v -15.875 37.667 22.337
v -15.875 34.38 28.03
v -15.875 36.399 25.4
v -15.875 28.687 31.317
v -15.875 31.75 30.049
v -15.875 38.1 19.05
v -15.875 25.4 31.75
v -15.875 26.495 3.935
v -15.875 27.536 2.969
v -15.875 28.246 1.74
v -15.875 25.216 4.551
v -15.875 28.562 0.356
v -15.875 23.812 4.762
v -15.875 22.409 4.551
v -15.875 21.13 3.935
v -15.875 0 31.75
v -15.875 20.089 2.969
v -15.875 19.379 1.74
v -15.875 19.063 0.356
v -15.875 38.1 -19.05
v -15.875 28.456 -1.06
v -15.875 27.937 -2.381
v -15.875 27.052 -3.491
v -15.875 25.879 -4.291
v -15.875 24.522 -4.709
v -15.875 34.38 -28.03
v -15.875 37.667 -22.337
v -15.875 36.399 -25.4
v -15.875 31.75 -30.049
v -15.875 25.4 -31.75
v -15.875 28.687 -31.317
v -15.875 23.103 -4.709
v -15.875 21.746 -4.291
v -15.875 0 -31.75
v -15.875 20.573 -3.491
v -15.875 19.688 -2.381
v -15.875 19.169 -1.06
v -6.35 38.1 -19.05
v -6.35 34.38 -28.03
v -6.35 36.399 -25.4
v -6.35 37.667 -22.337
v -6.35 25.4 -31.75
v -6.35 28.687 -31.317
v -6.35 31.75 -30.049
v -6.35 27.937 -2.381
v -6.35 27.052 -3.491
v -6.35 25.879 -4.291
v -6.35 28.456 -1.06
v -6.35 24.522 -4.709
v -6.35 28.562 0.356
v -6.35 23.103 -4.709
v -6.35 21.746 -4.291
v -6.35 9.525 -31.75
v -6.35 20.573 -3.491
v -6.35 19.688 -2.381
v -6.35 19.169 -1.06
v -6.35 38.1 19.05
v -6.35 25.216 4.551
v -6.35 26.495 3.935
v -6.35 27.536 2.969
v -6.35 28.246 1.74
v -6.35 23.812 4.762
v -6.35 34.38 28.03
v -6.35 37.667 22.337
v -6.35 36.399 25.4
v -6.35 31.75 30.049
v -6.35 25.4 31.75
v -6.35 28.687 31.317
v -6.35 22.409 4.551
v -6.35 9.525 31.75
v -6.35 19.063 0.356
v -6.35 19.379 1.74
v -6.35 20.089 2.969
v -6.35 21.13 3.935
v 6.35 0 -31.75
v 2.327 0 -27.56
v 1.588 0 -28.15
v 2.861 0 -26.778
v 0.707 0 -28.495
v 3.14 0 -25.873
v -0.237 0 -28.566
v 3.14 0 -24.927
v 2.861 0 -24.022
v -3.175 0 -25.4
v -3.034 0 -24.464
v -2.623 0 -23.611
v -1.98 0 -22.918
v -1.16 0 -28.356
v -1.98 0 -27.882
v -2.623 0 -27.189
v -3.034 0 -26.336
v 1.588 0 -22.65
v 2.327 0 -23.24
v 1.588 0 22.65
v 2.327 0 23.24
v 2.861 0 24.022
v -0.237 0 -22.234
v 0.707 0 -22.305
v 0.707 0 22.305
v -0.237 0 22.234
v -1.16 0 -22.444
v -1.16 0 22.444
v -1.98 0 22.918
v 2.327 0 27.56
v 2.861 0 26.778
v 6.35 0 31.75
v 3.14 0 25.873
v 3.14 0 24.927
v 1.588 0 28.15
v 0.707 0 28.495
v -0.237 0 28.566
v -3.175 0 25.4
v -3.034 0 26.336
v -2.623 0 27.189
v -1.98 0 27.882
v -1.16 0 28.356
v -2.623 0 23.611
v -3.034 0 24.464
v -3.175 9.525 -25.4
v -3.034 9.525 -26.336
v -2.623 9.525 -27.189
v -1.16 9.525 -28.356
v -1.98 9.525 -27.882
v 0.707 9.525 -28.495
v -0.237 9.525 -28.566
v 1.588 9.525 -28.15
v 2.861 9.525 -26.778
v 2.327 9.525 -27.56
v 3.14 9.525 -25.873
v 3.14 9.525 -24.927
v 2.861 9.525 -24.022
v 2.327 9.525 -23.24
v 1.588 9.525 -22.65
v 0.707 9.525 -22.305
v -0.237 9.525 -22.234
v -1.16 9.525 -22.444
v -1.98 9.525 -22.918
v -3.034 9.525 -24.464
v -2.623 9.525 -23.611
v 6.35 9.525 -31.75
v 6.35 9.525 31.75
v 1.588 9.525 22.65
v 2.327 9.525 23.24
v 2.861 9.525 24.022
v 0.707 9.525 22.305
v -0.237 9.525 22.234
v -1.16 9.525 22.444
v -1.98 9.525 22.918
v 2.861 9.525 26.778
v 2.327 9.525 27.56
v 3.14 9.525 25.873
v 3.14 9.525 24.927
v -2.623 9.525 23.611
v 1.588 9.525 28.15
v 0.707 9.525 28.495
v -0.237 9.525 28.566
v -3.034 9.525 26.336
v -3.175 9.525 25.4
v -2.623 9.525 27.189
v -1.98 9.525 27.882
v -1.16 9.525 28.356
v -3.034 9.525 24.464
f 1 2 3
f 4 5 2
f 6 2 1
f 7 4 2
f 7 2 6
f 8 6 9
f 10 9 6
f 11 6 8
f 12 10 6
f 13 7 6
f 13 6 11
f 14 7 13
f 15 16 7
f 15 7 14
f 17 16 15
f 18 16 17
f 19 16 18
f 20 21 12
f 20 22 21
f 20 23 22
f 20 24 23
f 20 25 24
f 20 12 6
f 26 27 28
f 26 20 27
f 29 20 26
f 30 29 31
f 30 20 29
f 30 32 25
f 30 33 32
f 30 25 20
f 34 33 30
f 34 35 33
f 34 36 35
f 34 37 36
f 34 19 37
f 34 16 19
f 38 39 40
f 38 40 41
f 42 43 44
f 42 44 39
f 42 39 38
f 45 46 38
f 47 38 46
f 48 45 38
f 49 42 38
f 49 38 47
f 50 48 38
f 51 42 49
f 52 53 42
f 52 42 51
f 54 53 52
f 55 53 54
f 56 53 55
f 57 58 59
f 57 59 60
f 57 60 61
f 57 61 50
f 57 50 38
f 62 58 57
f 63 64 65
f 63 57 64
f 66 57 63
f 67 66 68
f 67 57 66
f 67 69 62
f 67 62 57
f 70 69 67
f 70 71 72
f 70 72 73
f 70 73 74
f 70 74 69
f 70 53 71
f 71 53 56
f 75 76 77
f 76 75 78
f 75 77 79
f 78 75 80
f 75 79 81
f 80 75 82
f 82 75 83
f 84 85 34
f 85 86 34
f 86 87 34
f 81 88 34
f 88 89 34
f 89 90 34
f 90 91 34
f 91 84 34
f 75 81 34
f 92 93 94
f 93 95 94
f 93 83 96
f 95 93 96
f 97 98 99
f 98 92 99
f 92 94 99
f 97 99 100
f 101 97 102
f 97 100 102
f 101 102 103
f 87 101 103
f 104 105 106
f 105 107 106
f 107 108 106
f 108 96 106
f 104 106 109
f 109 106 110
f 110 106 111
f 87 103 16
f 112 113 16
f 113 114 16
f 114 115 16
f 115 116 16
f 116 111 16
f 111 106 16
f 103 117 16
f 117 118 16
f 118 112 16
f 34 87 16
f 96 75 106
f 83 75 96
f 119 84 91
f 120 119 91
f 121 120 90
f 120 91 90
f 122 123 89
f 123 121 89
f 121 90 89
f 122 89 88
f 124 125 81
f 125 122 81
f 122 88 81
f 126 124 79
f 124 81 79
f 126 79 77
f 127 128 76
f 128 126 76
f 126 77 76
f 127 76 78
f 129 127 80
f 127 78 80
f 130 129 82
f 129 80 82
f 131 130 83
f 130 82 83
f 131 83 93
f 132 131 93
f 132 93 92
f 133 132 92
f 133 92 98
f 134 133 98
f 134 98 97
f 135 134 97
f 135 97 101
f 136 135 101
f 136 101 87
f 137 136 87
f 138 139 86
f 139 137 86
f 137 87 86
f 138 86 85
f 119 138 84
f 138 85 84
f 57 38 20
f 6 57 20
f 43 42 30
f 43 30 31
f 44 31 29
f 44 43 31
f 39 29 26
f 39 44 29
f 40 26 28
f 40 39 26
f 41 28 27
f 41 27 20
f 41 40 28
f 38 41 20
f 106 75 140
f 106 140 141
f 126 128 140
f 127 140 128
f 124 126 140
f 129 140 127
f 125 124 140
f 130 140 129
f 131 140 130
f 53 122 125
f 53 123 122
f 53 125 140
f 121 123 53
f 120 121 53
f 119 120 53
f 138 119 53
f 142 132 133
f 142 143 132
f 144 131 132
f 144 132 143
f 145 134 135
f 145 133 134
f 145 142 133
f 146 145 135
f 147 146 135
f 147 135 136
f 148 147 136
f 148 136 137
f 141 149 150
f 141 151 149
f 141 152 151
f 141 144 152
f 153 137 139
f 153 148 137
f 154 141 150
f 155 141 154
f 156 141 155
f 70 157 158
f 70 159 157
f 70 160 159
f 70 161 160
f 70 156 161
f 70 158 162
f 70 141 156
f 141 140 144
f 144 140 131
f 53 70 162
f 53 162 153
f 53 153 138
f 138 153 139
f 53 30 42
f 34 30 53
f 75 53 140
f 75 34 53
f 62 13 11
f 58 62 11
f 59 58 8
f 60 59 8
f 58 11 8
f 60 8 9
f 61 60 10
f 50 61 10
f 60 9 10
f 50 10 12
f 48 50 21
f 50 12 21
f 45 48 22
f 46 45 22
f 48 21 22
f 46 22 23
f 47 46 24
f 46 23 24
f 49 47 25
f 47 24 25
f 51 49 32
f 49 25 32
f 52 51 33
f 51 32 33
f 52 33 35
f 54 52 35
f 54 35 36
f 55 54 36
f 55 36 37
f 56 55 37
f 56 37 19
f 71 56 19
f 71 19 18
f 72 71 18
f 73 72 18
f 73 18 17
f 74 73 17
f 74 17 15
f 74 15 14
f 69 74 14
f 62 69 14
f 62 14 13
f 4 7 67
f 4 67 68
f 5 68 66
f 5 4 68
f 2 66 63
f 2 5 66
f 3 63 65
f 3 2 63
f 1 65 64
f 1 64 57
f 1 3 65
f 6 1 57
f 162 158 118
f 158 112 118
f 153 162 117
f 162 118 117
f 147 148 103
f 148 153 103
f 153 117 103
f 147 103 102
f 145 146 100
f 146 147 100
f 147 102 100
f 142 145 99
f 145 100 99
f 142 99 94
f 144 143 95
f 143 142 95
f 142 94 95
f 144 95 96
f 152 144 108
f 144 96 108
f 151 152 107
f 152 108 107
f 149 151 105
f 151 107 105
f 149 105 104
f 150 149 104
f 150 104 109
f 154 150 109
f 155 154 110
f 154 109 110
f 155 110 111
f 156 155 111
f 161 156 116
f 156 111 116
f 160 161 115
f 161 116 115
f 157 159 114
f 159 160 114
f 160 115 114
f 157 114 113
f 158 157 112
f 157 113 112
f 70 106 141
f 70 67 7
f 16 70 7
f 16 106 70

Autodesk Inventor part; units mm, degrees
ref_plane "YZ Plane" through (0, 0, 0) normal (1, 0, 0) x (0, 1, 0)
ref_plane "XZ Plane" through (0, 0, 0) normal (0, 1, 0) x (-1, 0, 0)
ref_plane "XY Plane" through (0, 0, 0) normal (0, 0, 1) x (1, 0, 0)
sketch "Sketch1" plane through (0, 0, 0) normal (0, 1, 0) x (-1, 0, 0)
  line L0 (-6.35, 31.75) -> (6.35, 31.75)
  line L1 (6.35, 31.75) -> (6.35, -31.75)
  line L2 (6.35, -31.75) -> (-6.35, -31.75)
  line L3 (-6.35, -31.75) -> (-6.35, 31.75)
  line L4 (-6.35, 31.75) -> (6.35, -31.75) construction
  line L5 (6.35, 31.75) -> (-6.35, -31.75) construction
  circle A0 centre (0, 25.4) radius 3.175
  circle A1 centre (0, -25.4) radius 3.175
  point P0 (0, 0)
  dimension "d0" = 12.7
  dimension "d1" = 63.5
  dimension "d2" = 6.35
  dimension "d3" = 6.35
  dimension "d4" = 50.8
  dimension "d5" = 6.35
extrude "Extrusion1" add sketch "Sketch1" along normal blind 9.525
sketch "Sketch2" plane through (0, 0, 0) normal (0, 1, 0) x (-1, 0, 0)
  line L0 (6.35, -31.75) -> (6.35, 31.75) projected
  line L1 (6.35, 31.75) -> (15.875, 31.75)
  line L2 (15.875, 31.75) -> (15.875, -31.75)
  line L3 (15.875, -31.75) -> (6.35, -31.75)
  line L4 (6.35, -31.75) -> (6.35, 31.75)
  point P0 (0, 0)
  dimension "d8" = 9.525
extrude "Extrusion2" add sketch "Sketch2" along normal blind 38.1
fillet "Fillet1" radius 12.7 2 edges at (-11.1125, 38.1, 31.75) (-11.1125, 38.1, -31.75)
sketch "Sketch3" plane through (-15.875, 0, -31.75) normal (-1, 0, 0) x (0, 0, 1)
  line L0 (50.8, 38.1) -> (12.7, 38.1) projected
  line L1 (31.75, 38.1) -> (31.75, 23.8125) construction
  circle A0 centre (31.75, 23.8125) radius 4.7625
  point P0 (31.75, 0)
  dimension "d12" = 14.2875
  dimension "d13" = 9.525
extrude "Extrusion3" cut sketch "Sketch3" against normal through all
equation "\"d3\" = d2"
properties part number "drum_holder" material "Aluminum 6061"
